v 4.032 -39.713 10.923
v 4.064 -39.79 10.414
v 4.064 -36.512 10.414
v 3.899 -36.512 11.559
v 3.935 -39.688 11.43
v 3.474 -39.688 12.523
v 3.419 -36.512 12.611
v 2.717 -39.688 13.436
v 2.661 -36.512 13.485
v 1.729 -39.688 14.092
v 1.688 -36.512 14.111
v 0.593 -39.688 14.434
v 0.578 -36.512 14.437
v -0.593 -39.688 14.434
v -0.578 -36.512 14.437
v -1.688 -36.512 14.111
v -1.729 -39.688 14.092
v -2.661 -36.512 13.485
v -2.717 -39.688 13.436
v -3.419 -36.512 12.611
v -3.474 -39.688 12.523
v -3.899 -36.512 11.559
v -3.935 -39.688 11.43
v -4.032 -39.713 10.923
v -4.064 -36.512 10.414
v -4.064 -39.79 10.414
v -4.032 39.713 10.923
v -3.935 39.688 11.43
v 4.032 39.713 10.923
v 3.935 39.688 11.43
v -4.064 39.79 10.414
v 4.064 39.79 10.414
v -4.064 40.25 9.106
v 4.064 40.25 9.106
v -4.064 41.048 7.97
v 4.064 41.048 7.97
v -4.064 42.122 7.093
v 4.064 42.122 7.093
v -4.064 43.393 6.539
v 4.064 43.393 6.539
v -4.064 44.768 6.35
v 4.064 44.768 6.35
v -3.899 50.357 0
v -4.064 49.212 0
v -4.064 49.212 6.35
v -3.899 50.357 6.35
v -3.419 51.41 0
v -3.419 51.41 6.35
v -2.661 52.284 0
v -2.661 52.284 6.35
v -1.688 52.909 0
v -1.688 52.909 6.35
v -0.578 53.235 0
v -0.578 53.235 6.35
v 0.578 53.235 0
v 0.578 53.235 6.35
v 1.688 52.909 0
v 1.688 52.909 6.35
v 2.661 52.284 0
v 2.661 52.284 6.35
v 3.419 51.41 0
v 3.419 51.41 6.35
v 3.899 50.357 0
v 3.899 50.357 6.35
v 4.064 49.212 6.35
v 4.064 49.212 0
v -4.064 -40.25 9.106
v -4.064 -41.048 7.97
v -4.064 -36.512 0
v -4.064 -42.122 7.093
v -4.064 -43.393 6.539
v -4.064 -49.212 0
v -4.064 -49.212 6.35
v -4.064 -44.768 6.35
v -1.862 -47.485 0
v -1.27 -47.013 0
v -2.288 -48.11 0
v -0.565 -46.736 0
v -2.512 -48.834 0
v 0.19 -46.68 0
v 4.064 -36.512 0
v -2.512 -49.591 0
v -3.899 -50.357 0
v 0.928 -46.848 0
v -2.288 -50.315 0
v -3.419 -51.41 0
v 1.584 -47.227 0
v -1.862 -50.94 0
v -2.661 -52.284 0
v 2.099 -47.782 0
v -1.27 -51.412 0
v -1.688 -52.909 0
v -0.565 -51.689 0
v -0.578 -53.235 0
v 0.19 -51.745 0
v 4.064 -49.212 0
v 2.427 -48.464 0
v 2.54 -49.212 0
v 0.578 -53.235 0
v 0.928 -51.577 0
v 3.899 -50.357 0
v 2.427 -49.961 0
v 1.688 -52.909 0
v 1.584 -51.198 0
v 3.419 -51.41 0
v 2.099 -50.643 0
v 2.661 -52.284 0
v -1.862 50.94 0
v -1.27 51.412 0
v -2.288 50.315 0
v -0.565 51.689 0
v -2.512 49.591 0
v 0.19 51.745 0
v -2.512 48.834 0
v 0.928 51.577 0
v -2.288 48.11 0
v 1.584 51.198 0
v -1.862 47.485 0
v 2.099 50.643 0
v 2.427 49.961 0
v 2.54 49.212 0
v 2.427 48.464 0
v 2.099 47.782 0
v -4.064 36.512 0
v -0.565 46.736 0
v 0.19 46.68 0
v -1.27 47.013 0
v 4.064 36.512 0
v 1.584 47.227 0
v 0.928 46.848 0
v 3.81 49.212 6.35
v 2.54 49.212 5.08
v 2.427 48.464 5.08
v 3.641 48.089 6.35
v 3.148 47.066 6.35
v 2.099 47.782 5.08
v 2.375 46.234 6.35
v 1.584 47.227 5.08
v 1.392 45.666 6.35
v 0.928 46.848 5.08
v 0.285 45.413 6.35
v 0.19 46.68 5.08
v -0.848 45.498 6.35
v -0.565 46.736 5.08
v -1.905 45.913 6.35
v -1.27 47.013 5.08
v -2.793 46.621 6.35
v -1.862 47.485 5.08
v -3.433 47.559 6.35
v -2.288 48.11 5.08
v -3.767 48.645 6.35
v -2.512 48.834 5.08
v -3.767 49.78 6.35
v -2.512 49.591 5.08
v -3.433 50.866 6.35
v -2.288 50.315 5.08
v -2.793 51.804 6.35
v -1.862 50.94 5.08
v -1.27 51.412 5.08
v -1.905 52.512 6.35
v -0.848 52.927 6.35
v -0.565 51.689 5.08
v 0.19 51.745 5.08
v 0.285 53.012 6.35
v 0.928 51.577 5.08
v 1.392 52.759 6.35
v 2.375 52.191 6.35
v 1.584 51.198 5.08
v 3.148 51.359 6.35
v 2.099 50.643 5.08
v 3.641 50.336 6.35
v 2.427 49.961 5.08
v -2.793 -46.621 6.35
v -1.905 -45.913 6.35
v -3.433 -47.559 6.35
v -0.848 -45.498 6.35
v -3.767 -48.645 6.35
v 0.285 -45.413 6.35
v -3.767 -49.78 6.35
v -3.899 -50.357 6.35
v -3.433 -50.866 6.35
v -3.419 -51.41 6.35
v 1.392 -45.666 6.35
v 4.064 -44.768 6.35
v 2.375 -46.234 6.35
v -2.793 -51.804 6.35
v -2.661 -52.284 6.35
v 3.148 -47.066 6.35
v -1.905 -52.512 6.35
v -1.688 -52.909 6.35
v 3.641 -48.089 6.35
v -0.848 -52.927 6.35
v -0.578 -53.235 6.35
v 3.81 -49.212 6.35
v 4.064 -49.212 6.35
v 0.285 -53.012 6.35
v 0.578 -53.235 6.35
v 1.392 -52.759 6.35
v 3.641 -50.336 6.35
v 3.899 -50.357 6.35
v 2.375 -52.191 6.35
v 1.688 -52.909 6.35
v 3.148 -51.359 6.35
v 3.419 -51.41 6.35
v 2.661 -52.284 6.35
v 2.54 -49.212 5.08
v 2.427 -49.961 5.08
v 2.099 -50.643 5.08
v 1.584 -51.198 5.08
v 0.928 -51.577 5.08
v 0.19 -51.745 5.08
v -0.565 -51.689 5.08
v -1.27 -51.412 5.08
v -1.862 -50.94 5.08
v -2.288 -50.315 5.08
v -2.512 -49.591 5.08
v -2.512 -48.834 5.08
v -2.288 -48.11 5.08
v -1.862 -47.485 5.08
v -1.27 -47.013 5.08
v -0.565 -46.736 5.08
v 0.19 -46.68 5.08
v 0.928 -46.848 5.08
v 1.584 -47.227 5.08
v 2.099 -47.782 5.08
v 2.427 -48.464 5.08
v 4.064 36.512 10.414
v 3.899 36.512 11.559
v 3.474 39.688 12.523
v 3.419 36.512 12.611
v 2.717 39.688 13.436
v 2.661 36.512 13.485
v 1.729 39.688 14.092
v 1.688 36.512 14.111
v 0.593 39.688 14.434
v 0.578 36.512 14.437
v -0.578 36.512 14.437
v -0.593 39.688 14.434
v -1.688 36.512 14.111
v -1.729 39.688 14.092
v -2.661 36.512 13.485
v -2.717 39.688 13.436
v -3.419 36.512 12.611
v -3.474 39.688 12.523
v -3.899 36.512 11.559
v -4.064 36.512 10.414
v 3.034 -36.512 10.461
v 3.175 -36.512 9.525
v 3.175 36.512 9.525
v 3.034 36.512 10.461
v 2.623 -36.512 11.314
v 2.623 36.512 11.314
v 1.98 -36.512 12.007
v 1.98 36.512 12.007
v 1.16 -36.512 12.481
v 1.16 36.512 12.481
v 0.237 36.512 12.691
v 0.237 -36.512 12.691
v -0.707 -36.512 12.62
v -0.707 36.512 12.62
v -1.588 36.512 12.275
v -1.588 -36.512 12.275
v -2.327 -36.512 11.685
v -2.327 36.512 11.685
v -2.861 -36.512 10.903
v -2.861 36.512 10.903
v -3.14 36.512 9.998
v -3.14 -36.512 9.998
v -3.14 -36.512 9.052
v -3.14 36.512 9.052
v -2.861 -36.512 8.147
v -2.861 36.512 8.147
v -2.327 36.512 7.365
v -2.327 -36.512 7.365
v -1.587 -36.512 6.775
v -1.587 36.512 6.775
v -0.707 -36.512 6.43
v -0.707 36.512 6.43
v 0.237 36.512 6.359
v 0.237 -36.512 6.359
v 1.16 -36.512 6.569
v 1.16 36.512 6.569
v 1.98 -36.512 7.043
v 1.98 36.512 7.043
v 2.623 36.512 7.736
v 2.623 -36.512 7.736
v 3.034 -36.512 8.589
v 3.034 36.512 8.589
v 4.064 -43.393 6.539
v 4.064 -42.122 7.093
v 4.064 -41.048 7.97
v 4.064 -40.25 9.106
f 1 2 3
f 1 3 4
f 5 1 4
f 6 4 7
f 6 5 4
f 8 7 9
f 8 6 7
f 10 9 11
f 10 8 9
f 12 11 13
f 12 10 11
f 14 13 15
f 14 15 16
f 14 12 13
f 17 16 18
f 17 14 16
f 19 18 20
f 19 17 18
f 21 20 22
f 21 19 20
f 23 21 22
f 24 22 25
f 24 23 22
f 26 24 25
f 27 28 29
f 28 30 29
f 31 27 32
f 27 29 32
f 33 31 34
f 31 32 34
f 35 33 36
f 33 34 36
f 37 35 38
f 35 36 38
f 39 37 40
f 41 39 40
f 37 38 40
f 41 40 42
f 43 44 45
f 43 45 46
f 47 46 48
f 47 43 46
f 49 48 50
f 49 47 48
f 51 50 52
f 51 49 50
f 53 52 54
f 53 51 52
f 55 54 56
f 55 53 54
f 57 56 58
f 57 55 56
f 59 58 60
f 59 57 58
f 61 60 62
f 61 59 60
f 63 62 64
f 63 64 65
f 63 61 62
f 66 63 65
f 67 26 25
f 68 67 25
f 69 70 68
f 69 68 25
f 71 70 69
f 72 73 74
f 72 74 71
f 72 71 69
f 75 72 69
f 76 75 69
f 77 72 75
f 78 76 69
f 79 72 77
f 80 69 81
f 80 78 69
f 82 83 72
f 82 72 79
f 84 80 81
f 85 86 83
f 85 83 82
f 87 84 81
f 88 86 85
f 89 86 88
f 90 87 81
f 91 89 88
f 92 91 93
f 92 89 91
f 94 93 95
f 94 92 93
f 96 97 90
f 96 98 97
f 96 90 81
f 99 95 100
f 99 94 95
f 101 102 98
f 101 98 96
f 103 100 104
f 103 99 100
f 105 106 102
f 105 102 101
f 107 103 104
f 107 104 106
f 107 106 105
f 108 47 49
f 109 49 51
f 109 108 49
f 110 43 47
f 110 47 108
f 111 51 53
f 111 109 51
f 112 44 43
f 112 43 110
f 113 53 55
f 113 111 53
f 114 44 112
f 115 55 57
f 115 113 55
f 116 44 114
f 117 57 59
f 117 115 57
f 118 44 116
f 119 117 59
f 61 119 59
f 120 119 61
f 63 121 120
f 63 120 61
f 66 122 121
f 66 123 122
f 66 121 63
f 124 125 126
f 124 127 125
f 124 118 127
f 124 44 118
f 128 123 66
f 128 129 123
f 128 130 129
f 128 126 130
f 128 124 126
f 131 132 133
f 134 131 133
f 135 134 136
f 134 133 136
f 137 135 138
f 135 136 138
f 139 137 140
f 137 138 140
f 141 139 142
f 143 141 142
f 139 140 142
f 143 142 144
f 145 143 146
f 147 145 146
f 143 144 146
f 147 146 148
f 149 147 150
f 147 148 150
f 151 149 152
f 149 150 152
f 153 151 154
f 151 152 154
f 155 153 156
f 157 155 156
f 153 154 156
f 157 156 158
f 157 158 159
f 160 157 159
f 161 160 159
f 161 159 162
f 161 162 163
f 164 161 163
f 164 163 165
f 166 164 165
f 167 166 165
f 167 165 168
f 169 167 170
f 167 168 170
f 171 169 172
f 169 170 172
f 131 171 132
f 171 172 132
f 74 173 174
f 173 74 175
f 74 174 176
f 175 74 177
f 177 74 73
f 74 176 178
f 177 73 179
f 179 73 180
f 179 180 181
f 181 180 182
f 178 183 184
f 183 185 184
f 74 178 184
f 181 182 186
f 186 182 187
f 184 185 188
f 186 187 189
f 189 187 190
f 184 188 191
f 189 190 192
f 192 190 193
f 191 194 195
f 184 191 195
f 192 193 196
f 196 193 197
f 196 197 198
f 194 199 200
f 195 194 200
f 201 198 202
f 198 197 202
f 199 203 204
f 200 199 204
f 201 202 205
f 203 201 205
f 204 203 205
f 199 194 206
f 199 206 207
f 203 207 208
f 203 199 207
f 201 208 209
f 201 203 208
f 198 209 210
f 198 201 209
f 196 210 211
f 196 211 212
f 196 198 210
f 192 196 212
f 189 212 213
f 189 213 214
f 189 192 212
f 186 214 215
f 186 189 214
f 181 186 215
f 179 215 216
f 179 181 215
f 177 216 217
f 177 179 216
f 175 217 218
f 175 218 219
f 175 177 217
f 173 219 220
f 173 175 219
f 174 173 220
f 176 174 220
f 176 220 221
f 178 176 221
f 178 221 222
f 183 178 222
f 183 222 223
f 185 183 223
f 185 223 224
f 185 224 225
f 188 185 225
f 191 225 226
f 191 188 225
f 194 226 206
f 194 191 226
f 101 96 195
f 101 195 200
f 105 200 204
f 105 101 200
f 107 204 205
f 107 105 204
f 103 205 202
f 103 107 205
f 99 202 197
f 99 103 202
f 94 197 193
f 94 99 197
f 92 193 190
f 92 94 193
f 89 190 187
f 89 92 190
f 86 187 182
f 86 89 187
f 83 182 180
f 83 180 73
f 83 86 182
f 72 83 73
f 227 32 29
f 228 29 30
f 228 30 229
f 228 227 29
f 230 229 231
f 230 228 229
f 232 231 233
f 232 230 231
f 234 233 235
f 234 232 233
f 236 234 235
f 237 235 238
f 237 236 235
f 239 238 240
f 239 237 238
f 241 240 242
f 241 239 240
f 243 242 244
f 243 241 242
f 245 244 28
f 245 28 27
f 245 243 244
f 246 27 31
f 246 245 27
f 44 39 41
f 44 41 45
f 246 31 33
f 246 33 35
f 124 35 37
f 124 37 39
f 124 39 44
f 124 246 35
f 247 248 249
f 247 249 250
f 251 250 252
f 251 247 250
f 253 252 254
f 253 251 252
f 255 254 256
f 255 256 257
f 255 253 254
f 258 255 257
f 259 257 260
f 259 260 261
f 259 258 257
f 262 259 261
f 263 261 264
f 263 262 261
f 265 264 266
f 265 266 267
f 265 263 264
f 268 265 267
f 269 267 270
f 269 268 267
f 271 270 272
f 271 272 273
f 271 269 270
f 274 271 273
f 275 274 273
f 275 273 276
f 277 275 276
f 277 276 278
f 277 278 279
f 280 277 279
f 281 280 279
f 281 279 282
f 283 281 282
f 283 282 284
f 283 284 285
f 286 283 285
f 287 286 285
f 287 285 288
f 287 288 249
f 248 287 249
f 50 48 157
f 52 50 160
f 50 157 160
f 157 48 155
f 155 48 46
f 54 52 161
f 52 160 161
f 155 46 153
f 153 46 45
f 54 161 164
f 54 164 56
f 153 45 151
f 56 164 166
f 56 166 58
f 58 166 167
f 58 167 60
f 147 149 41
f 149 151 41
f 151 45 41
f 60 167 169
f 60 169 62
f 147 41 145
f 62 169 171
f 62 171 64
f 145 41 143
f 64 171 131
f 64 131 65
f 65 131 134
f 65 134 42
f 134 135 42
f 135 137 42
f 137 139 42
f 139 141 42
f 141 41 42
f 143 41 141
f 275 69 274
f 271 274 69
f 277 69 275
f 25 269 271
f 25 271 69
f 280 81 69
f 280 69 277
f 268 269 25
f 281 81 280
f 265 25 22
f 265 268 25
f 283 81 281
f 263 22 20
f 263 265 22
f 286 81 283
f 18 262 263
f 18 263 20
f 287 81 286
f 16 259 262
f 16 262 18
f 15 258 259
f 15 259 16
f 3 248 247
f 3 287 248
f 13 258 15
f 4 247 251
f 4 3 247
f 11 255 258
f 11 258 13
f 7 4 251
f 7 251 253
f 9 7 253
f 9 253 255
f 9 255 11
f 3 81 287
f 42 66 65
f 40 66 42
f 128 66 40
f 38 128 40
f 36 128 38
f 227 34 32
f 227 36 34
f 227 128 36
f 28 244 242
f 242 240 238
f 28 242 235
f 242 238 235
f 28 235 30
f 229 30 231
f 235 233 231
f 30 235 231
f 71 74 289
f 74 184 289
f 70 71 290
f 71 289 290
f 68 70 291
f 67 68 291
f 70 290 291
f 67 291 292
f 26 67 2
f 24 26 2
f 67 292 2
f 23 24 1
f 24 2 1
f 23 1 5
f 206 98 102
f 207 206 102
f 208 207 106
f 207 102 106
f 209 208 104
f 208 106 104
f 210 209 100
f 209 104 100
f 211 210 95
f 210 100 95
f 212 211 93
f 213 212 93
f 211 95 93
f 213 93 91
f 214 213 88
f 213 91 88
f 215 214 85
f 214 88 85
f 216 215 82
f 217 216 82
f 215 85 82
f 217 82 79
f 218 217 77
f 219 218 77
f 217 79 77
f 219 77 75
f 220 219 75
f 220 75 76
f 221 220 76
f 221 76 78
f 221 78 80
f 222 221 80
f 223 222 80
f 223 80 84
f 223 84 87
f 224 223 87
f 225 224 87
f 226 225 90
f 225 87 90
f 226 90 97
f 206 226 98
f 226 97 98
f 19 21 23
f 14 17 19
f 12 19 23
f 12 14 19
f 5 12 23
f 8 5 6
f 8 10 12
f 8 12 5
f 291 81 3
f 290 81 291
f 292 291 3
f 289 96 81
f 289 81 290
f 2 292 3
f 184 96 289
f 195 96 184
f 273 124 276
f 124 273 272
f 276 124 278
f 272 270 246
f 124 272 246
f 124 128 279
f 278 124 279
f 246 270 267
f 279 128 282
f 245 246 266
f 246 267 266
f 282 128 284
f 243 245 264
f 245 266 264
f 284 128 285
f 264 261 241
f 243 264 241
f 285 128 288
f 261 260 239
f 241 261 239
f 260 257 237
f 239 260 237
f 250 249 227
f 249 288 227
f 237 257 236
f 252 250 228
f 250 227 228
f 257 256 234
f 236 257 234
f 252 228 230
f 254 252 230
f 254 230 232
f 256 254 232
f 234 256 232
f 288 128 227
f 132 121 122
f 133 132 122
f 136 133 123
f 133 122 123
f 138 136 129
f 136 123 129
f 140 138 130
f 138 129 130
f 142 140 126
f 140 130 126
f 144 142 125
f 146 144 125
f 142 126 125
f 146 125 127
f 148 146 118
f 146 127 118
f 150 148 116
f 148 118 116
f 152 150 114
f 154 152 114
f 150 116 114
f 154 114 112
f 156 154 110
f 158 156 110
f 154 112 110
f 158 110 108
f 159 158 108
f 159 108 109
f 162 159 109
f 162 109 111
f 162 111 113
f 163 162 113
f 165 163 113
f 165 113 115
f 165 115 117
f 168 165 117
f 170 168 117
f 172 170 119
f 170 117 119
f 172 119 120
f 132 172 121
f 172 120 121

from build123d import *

# Parameters (mm, degrees)
F0_R     = 3.175
F1_DEPTH = 39.6875
F2_W     = 73.025
F2_H     = 18.185855
F3_DEPTH = 12.7
F4_R     = 3.175
F5_DEPTH = 79.375
F6_W     = 9.525
F6_H     = 3.175
F7_DEPTH = 12.7
F8_R     = 2.54
F9_DEPTH = 6.35
F10_R    = 5.08
F11_SIZE = 1.27


with BuildPart() as f1:
    # F0 (on Front) → F1 (new body, symmetric)
    with BuildSketch(Plane.XZ):
        with BuildLine():
            Line((4.064, 0), (4.064, 10.414))
            ThreePointArc((4.064, 10.414), (0, 14.478), (-4.064, 10.414))
            Line((-4.064, 10.414), (-4.064, 0))
            Line((-4.064, 0), (4.064, 0))
        make_face()
        with Locations((0, 9.525)):
            Circle(F0_R, mode=Mode.SUBTRACT)
    extrude(amount=F1_DEPTH, both=True)

    # F2 (on Right) → F3 (cut, symmetric)
    with BuildSketch(Plane.YZ):
        with Locations((0, 6.139678)):
            Rectangle(F2_W, F2_H)
    extrude(amount=F3_DEPTH, both=True, mode=Mode.SUBTRACT)

    # F4 (on face) → F5 (join)
    with BuildSketch(Plane.XZ.offset(39.6875)):
        with Locations((0, 9.525)):
            Circle(F4_R)
    extrude(amount=-F5_DEPTH)

    # F6 (on Right) → F7 (cut, symmetric)
    with BuildSketch(Plane.YZ):
        with Locations((-30.7975, 2.8575)):
            Rectangle(F6_W, F6_H)
        with Locations((30.7975, 2.8575)):
            Rectangle(F6_W, F6_H)
    extrude(amount=F7_DEPTH, both=True, mode=Mode.SUBTRACT)

    # F8 (on face) → F9 (join)
    with BuildSketch(Plane(origin=(0, 0, 0), x_dir=(1, 0, 0), z_dir=(0, 0, -1))):
        with BuildLine():
            Line((-4.064, 36.5125), (4.064, 36.5125))
            Line((4.064, 36.5125), (4.064, 49.2125))
            ThreePointArc((4.064, 49.2125), (0, 53.2765), (-4.064, 49.2125))
            Line((-4.064, 49.2125), (-4.064, 36.5125))
        make_face()
        with Locations((0, 49.2125)):
            Circle(F8_R, mode=Mode.SUBTRACT)
        with BuildLine():
            ThreePointArc((-4.064, -49.2125), (0, -53.2765), (4.064, -49.2125))
            Line((4.064, -49.2125), (4.064, -36.5125))
            Line((4.064, -36.5125), (-4.064, -36.5125))
            Line((-4.064, -36.5125), (-4.064, -49.2125))
        make_face()
        with Locations((0, -49.2125)):
            Circle(F8_R, mode=Mode.SUBTRACT)
    extrude(amount=-F9_DEPTH)

    # F10
    f10_edges = [f1.edges().sort_by_distance(p)[0] for p in [
        (0, 39.6875, 6.35),
        (0, -39.6875, 6.35),
    ]]
    fillet(f10_edges, radius=F10_R)

    # F11
    f11_edges = [f1.edges().sort_by_distance(p)[0] for p in [
        (-2.54, -49.2125, 6.35),
        (-2.54, 49.2125, 6.35),
    ]]
    chamfer(f11_edges, length=F11_SIZE)


solid = f1.part
